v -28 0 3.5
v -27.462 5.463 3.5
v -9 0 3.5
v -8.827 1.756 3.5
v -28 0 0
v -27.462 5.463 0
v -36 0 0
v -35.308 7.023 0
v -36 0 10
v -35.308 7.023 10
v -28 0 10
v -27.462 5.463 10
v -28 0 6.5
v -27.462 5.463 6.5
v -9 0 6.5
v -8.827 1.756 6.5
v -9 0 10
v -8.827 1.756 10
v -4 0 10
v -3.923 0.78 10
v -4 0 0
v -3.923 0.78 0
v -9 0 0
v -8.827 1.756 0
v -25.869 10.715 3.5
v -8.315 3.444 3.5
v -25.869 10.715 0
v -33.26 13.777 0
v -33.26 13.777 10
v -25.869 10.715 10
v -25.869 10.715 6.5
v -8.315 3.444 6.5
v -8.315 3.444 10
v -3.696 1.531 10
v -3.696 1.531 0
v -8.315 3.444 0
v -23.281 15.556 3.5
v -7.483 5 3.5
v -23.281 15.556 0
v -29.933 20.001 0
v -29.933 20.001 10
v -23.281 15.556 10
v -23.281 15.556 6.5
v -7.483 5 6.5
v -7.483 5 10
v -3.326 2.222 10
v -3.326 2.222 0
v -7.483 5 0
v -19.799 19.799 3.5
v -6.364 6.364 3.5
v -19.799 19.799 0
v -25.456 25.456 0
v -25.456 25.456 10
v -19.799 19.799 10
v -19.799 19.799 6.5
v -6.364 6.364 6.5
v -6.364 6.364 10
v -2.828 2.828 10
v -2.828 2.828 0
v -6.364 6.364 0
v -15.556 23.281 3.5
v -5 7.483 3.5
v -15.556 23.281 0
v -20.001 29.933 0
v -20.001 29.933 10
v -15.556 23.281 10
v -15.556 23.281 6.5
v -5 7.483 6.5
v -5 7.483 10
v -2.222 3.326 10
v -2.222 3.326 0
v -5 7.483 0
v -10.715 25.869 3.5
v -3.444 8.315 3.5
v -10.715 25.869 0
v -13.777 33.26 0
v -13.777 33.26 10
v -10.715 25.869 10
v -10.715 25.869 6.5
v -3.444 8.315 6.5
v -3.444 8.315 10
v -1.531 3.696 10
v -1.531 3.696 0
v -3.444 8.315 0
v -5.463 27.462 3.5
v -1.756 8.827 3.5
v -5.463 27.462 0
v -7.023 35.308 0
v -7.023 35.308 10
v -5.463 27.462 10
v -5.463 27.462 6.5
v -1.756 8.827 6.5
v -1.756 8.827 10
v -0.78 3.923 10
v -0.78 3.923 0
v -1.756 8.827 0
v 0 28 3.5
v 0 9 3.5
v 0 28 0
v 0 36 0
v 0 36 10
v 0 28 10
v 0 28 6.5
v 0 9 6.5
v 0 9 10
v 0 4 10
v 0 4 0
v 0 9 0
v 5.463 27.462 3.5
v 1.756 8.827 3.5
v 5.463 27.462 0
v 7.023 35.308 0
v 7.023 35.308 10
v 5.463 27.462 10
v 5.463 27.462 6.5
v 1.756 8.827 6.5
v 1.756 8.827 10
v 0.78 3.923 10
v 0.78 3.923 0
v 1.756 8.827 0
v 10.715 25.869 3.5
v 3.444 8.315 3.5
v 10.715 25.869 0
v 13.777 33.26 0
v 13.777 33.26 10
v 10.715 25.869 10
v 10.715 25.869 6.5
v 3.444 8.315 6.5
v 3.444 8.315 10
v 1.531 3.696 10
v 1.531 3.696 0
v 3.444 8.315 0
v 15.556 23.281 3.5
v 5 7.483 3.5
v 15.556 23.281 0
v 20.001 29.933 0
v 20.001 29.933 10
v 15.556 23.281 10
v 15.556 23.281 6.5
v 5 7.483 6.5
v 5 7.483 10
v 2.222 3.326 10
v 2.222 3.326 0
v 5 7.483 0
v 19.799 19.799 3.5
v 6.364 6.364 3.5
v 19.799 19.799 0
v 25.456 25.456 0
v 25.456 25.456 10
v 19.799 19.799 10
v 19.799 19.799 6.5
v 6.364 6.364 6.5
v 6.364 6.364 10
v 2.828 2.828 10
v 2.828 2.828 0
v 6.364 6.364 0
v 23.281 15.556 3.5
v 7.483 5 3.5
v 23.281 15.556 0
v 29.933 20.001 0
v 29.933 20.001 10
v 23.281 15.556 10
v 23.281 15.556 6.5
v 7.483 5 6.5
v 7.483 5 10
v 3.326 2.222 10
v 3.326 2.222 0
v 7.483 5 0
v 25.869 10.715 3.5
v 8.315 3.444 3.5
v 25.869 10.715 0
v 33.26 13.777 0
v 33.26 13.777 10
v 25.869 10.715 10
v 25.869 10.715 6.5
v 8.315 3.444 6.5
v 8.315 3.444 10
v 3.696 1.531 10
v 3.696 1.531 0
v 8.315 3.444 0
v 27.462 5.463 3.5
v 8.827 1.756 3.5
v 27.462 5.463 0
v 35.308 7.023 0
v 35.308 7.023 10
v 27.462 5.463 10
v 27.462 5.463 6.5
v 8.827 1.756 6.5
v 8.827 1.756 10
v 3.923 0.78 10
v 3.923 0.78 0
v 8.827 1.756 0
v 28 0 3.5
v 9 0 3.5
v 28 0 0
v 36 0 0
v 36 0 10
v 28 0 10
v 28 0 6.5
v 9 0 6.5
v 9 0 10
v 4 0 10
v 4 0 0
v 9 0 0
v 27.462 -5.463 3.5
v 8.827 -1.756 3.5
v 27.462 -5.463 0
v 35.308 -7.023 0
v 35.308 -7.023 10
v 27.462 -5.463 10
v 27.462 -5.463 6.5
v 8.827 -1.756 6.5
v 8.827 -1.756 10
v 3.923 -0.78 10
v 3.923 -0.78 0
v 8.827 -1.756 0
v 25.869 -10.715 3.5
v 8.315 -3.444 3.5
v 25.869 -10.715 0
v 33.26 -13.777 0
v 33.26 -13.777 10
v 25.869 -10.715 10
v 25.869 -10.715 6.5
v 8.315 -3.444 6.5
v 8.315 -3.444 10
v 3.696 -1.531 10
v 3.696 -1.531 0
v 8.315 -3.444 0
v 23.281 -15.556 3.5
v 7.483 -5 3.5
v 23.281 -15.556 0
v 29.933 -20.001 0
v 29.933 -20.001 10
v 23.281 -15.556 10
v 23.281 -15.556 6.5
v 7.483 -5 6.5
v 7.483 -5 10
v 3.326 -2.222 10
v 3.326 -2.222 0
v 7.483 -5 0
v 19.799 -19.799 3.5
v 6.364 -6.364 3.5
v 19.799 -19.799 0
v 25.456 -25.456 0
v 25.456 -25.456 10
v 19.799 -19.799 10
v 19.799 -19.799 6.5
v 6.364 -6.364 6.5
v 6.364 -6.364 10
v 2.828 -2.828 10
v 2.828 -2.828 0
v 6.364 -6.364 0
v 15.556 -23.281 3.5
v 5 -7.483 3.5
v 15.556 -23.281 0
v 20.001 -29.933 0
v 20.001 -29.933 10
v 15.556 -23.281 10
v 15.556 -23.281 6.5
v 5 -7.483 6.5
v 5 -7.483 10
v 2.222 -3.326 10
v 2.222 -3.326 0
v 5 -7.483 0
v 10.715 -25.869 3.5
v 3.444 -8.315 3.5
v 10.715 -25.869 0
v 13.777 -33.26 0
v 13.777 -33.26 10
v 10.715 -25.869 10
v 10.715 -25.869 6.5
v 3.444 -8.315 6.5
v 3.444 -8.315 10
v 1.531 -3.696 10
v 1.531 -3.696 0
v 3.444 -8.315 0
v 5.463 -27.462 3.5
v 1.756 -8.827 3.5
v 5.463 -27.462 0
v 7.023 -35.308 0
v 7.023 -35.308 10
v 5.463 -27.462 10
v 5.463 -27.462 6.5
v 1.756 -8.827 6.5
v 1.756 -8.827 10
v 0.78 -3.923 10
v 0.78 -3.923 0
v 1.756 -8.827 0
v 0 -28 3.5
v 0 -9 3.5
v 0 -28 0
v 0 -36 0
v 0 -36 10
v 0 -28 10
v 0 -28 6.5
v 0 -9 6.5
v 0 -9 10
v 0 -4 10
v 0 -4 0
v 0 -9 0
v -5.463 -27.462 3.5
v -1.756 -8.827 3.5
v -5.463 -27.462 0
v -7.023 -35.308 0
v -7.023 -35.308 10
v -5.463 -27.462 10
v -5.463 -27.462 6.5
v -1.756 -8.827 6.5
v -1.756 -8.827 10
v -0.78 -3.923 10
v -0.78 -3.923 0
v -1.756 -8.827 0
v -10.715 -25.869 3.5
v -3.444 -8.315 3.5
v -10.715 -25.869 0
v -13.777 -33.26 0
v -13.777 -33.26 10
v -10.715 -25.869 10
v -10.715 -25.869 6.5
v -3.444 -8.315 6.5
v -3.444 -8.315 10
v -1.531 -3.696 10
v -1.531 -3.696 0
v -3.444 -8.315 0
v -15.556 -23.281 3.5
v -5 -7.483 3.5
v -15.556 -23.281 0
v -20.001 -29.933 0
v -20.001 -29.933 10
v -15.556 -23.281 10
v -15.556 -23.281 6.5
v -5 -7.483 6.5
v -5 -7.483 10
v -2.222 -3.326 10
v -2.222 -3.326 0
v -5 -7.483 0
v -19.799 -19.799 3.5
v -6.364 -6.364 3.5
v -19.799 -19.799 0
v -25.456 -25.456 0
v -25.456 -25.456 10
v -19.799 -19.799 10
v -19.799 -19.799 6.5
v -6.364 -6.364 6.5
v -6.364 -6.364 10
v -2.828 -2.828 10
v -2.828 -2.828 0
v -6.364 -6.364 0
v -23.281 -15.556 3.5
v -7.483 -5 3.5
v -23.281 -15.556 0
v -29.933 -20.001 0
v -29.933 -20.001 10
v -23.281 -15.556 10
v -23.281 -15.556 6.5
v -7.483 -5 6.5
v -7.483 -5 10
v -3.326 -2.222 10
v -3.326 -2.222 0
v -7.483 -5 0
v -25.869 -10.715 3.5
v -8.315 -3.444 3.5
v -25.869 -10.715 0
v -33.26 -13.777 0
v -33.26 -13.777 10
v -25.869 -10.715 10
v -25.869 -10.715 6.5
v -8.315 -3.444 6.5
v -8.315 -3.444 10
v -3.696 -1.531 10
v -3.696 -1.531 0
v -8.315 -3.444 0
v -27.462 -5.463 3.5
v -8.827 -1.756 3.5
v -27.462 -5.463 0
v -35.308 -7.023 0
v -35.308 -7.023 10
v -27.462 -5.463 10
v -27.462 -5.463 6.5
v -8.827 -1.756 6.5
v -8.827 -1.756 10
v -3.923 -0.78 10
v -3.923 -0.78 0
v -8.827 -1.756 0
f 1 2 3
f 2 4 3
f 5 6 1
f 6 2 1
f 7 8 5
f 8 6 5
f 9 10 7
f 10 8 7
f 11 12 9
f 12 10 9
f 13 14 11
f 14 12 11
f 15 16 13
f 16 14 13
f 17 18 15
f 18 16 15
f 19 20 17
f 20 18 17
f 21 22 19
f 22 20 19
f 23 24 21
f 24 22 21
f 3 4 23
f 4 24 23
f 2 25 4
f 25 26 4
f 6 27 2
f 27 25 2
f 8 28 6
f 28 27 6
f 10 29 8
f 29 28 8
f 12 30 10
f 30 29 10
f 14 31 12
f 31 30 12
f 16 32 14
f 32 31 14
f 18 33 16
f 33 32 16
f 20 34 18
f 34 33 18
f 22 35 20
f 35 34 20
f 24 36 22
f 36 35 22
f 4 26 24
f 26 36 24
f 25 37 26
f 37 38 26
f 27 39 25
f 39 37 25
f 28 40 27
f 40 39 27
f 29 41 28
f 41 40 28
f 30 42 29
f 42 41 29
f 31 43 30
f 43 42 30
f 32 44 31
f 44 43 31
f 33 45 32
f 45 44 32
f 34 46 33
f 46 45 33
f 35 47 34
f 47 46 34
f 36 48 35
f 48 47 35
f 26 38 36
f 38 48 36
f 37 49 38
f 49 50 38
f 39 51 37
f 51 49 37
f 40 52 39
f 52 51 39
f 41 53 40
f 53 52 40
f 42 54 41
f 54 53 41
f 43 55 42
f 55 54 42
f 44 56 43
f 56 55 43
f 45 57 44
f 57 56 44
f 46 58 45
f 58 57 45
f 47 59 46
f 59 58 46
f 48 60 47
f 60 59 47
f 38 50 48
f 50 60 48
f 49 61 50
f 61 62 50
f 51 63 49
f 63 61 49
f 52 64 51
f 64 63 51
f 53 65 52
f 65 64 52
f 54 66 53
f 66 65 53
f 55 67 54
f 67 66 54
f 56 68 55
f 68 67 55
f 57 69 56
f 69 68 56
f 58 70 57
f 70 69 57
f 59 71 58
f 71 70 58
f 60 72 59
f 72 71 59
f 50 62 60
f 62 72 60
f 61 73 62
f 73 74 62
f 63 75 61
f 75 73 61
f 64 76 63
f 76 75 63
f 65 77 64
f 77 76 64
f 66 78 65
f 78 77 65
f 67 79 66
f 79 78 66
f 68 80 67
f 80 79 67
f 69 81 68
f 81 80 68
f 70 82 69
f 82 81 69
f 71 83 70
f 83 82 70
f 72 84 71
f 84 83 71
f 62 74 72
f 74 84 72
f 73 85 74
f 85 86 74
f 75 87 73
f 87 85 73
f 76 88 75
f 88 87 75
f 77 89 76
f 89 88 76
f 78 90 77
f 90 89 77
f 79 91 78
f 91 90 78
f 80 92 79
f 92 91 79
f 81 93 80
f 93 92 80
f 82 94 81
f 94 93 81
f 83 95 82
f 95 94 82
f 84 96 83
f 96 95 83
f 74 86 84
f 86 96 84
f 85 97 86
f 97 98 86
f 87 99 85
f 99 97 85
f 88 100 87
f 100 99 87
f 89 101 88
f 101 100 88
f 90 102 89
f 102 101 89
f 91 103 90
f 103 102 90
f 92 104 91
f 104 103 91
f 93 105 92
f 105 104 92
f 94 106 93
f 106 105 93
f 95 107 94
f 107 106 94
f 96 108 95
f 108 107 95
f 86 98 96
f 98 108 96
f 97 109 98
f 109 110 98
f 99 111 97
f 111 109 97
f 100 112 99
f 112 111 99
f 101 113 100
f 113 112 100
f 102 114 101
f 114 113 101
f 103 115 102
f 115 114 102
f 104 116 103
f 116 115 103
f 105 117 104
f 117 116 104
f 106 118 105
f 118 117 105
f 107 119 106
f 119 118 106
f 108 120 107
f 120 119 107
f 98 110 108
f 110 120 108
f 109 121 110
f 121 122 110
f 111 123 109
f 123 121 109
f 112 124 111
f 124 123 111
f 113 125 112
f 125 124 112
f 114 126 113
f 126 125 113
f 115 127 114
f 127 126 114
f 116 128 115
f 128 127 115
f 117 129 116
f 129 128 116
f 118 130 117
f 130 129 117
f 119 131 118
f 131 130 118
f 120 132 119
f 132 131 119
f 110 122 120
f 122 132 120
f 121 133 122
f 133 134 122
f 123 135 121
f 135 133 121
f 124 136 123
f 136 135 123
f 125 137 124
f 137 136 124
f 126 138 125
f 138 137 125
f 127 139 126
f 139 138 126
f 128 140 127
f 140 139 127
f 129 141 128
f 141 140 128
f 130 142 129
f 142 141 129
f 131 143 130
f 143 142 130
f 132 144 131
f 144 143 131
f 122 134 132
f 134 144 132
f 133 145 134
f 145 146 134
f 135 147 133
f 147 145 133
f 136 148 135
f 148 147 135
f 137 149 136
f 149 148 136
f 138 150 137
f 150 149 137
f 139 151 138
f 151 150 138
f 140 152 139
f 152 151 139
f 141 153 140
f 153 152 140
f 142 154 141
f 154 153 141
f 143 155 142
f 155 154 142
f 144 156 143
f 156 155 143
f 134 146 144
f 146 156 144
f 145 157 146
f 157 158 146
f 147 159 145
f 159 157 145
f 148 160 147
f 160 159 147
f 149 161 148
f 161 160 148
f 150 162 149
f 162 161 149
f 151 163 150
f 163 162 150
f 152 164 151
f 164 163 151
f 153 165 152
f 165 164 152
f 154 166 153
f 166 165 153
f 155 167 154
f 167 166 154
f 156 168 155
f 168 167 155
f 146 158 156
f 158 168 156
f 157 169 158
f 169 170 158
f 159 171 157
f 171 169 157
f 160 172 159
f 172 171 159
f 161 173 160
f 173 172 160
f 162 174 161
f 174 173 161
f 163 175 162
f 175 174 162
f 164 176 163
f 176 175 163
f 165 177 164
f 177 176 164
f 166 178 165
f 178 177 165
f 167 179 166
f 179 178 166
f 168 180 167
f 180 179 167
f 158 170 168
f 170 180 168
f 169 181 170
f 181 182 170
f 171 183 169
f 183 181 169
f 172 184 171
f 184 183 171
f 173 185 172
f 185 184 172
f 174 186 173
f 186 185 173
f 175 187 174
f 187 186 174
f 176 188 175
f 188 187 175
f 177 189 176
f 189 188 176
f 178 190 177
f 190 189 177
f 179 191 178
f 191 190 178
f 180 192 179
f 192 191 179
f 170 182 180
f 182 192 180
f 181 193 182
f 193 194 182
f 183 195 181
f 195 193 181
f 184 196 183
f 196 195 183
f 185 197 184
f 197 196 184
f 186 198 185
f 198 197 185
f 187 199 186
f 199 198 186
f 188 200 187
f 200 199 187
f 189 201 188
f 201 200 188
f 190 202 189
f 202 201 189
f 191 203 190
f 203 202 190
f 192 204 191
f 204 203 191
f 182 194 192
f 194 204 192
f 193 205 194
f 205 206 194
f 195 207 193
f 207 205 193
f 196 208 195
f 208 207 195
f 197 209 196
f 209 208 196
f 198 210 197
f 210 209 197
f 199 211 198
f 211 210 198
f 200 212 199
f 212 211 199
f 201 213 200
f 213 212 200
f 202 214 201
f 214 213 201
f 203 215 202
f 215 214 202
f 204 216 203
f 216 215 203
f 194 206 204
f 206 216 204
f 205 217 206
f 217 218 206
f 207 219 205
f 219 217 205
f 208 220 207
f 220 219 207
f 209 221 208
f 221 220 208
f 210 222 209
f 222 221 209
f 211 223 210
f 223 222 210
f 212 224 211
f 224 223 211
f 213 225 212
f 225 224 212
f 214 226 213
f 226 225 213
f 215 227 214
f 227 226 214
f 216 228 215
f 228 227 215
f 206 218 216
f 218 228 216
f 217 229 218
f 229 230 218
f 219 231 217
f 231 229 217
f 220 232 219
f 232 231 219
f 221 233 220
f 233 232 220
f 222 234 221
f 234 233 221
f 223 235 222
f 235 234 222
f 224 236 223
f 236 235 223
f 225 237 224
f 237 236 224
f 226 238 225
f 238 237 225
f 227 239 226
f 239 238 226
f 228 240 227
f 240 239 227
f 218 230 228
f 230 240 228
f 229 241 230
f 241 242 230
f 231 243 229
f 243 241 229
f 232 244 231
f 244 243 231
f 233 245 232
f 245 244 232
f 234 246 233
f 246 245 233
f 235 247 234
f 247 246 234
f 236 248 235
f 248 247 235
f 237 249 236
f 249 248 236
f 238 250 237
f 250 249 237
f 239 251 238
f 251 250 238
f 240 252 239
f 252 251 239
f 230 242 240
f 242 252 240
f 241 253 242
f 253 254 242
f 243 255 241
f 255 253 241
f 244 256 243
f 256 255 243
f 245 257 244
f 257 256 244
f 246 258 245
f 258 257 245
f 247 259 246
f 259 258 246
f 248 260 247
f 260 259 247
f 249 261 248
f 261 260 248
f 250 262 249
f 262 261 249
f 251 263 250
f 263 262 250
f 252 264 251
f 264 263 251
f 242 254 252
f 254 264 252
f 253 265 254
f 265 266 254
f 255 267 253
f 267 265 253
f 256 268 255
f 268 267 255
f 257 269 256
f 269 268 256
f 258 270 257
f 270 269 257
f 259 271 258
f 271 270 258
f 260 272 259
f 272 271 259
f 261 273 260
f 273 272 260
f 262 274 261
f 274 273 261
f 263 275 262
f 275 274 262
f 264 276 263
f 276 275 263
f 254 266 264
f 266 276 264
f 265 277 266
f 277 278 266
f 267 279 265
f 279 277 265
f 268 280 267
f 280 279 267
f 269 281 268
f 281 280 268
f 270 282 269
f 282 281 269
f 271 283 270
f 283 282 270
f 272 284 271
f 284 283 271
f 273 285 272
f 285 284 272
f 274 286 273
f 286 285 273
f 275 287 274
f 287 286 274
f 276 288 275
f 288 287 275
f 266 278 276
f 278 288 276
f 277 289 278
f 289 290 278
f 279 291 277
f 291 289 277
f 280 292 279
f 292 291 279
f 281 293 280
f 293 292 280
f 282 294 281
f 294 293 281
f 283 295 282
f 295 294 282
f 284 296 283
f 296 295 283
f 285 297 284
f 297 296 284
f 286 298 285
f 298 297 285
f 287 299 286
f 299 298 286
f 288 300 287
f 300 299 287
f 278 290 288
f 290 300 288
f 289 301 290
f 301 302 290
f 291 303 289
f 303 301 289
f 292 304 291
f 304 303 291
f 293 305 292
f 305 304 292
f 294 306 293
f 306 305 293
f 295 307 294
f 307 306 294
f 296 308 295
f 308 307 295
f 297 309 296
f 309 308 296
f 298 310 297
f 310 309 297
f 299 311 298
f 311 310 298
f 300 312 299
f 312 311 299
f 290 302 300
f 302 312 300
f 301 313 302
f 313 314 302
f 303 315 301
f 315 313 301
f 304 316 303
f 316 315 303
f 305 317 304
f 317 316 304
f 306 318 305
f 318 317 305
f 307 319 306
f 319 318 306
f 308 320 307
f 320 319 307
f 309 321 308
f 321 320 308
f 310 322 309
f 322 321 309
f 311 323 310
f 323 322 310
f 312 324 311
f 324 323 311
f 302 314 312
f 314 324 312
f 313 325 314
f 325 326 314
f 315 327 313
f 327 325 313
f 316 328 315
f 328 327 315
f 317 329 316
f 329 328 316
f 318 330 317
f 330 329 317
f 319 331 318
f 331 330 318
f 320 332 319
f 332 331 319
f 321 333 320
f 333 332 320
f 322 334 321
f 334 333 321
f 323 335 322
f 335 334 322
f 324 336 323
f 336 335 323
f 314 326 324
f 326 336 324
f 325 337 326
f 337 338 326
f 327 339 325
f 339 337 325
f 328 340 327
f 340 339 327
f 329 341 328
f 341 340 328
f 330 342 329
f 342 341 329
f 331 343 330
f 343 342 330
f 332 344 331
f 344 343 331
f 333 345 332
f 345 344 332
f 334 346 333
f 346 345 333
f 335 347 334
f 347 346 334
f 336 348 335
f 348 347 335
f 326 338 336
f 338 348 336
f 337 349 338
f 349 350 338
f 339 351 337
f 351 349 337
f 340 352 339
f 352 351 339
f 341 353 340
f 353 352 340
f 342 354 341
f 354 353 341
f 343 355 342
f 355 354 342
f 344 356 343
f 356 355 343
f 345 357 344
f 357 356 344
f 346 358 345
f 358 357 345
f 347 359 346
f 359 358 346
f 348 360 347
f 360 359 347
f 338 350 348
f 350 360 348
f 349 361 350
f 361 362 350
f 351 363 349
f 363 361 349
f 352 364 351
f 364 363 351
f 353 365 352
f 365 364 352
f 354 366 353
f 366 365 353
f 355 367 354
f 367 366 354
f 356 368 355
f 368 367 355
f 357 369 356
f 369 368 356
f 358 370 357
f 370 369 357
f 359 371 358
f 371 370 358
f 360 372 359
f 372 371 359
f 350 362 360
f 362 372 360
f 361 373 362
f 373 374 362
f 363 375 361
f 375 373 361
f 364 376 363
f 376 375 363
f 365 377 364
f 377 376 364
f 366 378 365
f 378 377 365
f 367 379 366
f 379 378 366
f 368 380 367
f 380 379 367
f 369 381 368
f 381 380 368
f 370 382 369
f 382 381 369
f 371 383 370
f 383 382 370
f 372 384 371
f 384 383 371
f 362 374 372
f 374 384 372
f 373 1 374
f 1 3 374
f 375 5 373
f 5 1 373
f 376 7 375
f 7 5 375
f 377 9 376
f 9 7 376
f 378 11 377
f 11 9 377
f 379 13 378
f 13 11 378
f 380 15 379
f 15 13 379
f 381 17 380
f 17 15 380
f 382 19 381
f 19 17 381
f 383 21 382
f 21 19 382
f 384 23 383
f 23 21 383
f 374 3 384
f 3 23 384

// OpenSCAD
$fn = 32;

// ----------------------------------------------------------------------
// Revolved part: handwheel R36
// ----------------------------------------------------------------------

// --- parameters (mm) ---
bore_r = 4;               // bore radius
rim_r = 36;               // rim radius
rim_w = 8;                // rim axial width
rim_t = 10;               // rim diameter height
hub_r = 9;                // hub radius
web_t = 3;                // web thickness
revolve_angle = 360;      // revolve sweep, degrees
fit_tol = 0.1;            // declared fit tolerance (prompt contract)
free_tol = 0.5;           // declared free tolerance (prompt contract)

bore_d = 2 * bore_r;
rim_d = 2 * rim_r;
hub_d = 2 * hub_r;

profile = [[4, 0], [9, 0], [9, 3.5], [28, 3.5], [28, 0], [36, 0], [36, 10], [28, 10], [28, 6.5], [9, 6.5], [9, 10], [4, 10]];  // primary outline, 12 points, counter clockwise

// --- the one profile operation ---
rotate_extrude(angle = revolve_angle) polygon(points = profile);
